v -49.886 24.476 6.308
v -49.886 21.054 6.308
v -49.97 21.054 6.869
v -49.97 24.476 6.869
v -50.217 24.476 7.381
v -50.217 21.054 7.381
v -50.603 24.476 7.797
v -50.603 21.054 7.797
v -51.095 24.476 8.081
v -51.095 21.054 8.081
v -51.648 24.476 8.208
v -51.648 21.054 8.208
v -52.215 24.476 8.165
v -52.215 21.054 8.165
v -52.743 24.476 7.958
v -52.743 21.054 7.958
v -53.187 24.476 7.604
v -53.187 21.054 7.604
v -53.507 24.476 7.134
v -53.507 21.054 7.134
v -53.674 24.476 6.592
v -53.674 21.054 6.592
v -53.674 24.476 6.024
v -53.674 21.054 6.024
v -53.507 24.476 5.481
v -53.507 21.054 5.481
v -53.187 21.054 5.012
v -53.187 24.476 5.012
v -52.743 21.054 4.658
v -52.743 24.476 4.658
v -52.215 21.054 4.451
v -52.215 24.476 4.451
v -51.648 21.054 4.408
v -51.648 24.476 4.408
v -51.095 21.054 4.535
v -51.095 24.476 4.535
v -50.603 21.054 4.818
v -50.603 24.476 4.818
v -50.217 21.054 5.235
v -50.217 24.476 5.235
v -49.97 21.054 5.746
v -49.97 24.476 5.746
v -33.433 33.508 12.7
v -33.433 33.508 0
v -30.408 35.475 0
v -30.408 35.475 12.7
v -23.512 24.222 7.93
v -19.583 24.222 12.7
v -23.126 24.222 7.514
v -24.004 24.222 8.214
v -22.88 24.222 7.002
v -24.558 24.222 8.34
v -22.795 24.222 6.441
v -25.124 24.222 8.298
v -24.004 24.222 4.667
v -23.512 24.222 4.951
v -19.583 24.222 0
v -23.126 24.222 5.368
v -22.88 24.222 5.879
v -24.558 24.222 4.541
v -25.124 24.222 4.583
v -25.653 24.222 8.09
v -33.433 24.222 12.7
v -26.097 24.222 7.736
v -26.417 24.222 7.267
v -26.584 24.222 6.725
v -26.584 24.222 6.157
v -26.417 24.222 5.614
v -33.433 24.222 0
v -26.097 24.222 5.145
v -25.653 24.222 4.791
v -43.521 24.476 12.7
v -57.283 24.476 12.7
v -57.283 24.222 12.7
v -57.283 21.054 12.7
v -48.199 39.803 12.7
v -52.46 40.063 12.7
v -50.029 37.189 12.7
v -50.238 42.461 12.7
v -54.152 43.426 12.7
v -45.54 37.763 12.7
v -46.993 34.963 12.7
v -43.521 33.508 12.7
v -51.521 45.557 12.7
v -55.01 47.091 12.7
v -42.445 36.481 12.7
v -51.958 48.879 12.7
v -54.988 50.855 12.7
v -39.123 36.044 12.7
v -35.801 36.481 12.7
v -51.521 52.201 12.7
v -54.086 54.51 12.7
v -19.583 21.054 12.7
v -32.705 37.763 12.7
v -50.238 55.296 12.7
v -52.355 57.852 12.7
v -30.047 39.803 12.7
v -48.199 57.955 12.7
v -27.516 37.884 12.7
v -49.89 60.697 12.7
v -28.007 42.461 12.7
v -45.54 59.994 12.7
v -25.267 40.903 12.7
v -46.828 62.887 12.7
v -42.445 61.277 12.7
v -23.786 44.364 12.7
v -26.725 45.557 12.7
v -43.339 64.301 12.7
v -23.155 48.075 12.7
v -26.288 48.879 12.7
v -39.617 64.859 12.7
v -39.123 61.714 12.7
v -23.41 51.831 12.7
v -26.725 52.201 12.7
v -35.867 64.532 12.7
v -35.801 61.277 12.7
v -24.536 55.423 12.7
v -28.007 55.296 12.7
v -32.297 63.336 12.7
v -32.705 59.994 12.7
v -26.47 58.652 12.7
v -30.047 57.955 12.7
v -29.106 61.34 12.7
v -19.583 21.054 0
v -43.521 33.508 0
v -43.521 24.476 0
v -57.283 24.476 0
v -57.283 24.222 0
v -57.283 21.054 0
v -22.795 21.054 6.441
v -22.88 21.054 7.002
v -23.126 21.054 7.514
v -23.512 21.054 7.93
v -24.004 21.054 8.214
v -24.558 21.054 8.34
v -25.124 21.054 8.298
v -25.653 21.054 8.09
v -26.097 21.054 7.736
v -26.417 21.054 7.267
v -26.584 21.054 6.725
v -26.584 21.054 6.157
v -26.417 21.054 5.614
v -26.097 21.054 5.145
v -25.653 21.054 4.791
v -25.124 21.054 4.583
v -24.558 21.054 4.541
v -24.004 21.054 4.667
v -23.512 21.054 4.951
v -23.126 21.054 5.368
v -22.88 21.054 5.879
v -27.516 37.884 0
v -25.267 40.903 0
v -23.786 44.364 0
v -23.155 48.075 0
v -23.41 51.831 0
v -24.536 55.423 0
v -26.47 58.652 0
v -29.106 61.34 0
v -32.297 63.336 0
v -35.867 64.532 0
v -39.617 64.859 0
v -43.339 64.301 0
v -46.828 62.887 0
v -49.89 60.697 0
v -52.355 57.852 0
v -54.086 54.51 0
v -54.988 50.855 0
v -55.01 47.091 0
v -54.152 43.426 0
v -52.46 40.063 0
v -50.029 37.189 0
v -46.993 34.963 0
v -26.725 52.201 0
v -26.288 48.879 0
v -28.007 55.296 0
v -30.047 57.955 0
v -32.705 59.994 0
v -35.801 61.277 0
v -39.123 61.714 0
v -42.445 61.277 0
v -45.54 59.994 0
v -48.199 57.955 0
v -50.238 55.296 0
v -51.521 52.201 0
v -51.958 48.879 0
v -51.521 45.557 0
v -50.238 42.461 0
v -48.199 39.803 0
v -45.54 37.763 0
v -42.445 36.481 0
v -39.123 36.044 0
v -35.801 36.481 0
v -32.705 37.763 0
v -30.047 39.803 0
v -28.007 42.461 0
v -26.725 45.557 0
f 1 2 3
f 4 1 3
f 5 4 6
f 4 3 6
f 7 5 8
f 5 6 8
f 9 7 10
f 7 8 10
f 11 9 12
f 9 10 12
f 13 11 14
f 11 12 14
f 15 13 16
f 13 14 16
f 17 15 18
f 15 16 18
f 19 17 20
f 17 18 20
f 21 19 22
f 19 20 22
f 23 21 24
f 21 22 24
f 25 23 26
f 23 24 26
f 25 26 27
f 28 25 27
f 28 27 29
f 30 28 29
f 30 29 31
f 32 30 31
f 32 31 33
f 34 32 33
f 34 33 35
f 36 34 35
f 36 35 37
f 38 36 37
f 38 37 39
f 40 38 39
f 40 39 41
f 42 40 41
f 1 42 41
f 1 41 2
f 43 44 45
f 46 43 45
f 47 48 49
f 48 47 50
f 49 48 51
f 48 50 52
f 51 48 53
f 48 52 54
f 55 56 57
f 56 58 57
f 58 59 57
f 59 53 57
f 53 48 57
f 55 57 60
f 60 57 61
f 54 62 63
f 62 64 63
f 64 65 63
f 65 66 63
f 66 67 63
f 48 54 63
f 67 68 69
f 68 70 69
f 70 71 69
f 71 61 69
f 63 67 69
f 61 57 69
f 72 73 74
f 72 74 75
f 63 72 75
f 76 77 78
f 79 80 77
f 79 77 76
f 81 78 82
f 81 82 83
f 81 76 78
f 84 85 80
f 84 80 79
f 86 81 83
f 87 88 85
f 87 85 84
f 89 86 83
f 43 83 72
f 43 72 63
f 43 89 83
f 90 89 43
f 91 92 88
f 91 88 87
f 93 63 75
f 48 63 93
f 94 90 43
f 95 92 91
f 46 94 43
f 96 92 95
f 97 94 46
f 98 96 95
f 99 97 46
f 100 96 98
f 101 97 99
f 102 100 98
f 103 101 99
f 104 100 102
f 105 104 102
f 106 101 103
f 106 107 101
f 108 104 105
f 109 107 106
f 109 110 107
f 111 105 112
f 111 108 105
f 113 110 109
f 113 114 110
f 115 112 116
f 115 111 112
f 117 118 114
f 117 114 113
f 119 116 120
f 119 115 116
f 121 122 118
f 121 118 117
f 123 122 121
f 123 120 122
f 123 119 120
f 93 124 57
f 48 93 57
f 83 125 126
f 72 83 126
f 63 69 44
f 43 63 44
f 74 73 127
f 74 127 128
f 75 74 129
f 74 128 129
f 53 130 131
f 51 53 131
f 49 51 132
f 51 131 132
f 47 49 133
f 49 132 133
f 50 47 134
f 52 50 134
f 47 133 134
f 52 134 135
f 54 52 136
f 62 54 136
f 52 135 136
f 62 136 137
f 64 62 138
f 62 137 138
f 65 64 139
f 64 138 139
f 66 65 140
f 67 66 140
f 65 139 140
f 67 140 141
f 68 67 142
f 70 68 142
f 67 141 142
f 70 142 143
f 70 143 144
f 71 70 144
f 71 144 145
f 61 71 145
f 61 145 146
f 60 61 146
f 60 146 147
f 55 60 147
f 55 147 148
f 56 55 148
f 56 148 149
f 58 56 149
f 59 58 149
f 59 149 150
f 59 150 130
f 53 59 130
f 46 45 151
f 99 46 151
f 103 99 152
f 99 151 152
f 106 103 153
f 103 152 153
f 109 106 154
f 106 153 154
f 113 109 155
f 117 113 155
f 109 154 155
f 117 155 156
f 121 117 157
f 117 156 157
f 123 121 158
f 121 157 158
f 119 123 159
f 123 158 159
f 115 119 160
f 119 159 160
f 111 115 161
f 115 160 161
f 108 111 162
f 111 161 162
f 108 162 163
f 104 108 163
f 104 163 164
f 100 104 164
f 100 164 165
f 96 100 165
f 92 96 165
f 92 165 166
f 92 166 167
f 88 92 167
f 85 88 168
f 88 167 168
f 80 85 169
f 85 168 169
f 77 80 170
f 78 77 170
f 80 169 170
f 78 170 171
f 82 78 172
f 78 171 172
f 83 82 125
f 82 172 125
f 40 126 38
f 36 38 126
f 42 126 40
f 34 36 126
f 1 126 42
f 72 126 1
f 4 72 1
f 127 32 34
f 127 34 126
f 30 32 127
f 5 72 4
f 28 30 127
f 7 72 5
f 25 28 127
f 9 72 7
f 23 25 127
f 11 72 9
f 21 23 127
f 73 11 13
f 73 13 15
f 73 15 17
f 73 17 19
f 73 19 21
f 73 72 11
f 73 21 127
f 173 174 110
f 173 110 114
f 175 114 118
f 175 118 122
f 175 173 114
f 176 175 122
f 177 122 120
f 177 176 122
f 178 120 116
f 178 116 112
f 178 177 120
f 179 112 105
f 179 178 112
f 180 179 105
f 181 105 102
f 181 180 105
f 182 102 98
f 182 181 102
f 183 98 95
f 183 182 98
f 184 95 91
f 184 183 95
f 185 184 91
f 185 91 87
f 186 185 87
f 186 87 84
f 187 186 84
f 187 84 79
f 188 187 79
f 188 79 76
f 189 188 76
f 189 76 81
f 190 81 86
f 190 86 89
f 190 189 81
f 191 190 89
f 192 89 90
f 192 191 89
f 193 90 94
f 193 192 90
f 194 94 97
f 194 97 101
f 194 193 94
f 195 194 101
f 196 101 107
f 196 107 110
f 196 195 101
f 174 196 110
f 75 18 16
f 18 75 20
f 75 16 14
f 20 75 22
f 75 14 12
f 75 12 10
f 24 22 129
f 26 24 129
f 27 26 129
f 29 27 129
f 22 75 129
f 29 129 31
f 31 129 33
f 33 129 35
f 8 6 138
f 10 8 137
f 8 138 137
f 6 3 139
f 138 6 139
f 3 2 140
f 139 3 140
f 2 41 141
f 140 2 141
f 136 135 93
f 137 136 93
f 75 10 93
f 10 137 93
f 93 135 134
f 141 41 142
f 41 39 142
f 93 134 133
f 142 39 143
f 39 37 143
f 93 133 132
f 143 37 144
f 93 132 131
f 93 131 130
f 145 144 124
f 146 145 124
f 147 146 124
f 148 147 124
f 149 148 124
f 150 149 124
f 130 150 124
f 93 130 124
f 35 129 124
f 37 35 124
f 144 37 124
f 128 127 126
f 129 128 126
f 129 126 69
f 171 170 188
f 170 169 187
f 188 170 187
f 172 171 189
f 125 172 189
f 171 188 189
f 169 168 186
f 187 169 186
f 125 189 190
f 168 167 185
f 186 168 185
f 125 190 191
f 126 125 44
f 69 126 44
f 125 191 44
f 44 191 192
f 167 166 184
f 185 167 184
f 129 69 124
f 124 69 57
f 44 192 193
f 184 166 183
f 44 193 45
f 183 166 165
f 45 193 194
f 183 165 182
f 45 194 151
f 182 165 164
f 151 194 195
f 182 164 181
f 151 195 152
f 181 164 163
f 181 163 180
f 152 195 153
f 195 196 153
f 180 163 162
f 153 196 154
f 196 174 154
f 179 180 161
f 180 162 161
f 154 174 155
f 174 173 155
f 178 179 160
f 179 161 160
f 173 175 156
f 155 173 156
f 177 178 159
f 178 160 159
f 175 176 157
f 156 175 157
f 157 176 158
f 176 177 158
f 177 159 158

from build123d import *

# Parameters (mm, degrees)
F0_R       = 12.835001
F1_DEPTH   = 12.7
F2_R       = 1.905
F1_FACE_W  = 37.6999124221
F1_FACE_H  = 12.7
F1_FACE1_W = 13.7613505735
F1_FACE1_H = 12.7
F3_DEPTH   = 0.254
F4_DEPTH   = 4.7498


with BuildPart() as f1:
    # F0 (on Top) → F1 (new body)
    with BuildSketch(Plane.XY):
        with BuildLine():
            Line((-33.4334959418, 33.5081874669), (-30.4082068312, 35.4751199209))
            ThreePointArc((-30.4082068312, 35.4751199209), (-41.4944322517, 64.6897953257), (-43.5214952555, 33.5081874669))
            Line((-43.5214952555, 33.5081874669), (-43.5214952555, 24.2223944372))
            Line((-43.5214952555, 24.2223944372), (-57.282845829, 24.2223944372))
            Line((-57.282845829, 24.2223944372), (-57.282845829, 21.0543349588))
            Line((-57.282845829, 21.0543349588), (-19.5829334069, 21.0543349588))
            Line((-19.5829334069, 21.0543349588), (-19.5829334069, 24.2223944372))
            Line((-19.5829334069, 24.2223944372), (-33.4334959418, 24.2223944372))
            Line((-33.4334959418, 24.2223944372), (-33.4334959418, 33.5081874669))
        make_face()
        with Locations((-39.122876168, 48.8789326412)):
            Circle(F0_R, mode=Mode.SUBTRACT)
    extrude(amount=F1_DEPTH)

    # F2 (on face) + F1_face (on face) + F1_face1 (on face) → F3 (join)
    with BuildSketch(Plane.XZ.offset(-21.0543349588)):
        with Locations((-51.7907068133, 6.3078426756)):
            Circle(F2_R)
    with BuildSketch(Plane(origin=(-38.432889618, 21.0543349588, 6.35), x_dir=(1, 0, 0), z_dir=(0, -1, 0))):
        Rectangle(F1_FACE_W, F1_FACE_H)
    with BuildSketch(Plane(origin=(-50.4021705423, 24.2223944372, 6.35), x_dir=(-1, 0, 0), z_dir=(0, 1, 0))):
        Rectangle(F1_FACE1_W, F1_FACE1_H)
    extrude(amount=-F3_DEPTH, dir=(0, -1, 0))

    # F2 (on face) → F4 (cut)
    with BuildSketch(Plane.XZ.offset(-21.0543349588)):
        with Locations((-24.7001815587, 6.4406394958)):
            Circle(F2_R)
        with Locations((-51.7907068133, 6.3078426756)):
            Circle(F2_R)
    extrude(amount=-F4_DEPTH, mode=Mode.SUBTRACT)


solid = f1.part
